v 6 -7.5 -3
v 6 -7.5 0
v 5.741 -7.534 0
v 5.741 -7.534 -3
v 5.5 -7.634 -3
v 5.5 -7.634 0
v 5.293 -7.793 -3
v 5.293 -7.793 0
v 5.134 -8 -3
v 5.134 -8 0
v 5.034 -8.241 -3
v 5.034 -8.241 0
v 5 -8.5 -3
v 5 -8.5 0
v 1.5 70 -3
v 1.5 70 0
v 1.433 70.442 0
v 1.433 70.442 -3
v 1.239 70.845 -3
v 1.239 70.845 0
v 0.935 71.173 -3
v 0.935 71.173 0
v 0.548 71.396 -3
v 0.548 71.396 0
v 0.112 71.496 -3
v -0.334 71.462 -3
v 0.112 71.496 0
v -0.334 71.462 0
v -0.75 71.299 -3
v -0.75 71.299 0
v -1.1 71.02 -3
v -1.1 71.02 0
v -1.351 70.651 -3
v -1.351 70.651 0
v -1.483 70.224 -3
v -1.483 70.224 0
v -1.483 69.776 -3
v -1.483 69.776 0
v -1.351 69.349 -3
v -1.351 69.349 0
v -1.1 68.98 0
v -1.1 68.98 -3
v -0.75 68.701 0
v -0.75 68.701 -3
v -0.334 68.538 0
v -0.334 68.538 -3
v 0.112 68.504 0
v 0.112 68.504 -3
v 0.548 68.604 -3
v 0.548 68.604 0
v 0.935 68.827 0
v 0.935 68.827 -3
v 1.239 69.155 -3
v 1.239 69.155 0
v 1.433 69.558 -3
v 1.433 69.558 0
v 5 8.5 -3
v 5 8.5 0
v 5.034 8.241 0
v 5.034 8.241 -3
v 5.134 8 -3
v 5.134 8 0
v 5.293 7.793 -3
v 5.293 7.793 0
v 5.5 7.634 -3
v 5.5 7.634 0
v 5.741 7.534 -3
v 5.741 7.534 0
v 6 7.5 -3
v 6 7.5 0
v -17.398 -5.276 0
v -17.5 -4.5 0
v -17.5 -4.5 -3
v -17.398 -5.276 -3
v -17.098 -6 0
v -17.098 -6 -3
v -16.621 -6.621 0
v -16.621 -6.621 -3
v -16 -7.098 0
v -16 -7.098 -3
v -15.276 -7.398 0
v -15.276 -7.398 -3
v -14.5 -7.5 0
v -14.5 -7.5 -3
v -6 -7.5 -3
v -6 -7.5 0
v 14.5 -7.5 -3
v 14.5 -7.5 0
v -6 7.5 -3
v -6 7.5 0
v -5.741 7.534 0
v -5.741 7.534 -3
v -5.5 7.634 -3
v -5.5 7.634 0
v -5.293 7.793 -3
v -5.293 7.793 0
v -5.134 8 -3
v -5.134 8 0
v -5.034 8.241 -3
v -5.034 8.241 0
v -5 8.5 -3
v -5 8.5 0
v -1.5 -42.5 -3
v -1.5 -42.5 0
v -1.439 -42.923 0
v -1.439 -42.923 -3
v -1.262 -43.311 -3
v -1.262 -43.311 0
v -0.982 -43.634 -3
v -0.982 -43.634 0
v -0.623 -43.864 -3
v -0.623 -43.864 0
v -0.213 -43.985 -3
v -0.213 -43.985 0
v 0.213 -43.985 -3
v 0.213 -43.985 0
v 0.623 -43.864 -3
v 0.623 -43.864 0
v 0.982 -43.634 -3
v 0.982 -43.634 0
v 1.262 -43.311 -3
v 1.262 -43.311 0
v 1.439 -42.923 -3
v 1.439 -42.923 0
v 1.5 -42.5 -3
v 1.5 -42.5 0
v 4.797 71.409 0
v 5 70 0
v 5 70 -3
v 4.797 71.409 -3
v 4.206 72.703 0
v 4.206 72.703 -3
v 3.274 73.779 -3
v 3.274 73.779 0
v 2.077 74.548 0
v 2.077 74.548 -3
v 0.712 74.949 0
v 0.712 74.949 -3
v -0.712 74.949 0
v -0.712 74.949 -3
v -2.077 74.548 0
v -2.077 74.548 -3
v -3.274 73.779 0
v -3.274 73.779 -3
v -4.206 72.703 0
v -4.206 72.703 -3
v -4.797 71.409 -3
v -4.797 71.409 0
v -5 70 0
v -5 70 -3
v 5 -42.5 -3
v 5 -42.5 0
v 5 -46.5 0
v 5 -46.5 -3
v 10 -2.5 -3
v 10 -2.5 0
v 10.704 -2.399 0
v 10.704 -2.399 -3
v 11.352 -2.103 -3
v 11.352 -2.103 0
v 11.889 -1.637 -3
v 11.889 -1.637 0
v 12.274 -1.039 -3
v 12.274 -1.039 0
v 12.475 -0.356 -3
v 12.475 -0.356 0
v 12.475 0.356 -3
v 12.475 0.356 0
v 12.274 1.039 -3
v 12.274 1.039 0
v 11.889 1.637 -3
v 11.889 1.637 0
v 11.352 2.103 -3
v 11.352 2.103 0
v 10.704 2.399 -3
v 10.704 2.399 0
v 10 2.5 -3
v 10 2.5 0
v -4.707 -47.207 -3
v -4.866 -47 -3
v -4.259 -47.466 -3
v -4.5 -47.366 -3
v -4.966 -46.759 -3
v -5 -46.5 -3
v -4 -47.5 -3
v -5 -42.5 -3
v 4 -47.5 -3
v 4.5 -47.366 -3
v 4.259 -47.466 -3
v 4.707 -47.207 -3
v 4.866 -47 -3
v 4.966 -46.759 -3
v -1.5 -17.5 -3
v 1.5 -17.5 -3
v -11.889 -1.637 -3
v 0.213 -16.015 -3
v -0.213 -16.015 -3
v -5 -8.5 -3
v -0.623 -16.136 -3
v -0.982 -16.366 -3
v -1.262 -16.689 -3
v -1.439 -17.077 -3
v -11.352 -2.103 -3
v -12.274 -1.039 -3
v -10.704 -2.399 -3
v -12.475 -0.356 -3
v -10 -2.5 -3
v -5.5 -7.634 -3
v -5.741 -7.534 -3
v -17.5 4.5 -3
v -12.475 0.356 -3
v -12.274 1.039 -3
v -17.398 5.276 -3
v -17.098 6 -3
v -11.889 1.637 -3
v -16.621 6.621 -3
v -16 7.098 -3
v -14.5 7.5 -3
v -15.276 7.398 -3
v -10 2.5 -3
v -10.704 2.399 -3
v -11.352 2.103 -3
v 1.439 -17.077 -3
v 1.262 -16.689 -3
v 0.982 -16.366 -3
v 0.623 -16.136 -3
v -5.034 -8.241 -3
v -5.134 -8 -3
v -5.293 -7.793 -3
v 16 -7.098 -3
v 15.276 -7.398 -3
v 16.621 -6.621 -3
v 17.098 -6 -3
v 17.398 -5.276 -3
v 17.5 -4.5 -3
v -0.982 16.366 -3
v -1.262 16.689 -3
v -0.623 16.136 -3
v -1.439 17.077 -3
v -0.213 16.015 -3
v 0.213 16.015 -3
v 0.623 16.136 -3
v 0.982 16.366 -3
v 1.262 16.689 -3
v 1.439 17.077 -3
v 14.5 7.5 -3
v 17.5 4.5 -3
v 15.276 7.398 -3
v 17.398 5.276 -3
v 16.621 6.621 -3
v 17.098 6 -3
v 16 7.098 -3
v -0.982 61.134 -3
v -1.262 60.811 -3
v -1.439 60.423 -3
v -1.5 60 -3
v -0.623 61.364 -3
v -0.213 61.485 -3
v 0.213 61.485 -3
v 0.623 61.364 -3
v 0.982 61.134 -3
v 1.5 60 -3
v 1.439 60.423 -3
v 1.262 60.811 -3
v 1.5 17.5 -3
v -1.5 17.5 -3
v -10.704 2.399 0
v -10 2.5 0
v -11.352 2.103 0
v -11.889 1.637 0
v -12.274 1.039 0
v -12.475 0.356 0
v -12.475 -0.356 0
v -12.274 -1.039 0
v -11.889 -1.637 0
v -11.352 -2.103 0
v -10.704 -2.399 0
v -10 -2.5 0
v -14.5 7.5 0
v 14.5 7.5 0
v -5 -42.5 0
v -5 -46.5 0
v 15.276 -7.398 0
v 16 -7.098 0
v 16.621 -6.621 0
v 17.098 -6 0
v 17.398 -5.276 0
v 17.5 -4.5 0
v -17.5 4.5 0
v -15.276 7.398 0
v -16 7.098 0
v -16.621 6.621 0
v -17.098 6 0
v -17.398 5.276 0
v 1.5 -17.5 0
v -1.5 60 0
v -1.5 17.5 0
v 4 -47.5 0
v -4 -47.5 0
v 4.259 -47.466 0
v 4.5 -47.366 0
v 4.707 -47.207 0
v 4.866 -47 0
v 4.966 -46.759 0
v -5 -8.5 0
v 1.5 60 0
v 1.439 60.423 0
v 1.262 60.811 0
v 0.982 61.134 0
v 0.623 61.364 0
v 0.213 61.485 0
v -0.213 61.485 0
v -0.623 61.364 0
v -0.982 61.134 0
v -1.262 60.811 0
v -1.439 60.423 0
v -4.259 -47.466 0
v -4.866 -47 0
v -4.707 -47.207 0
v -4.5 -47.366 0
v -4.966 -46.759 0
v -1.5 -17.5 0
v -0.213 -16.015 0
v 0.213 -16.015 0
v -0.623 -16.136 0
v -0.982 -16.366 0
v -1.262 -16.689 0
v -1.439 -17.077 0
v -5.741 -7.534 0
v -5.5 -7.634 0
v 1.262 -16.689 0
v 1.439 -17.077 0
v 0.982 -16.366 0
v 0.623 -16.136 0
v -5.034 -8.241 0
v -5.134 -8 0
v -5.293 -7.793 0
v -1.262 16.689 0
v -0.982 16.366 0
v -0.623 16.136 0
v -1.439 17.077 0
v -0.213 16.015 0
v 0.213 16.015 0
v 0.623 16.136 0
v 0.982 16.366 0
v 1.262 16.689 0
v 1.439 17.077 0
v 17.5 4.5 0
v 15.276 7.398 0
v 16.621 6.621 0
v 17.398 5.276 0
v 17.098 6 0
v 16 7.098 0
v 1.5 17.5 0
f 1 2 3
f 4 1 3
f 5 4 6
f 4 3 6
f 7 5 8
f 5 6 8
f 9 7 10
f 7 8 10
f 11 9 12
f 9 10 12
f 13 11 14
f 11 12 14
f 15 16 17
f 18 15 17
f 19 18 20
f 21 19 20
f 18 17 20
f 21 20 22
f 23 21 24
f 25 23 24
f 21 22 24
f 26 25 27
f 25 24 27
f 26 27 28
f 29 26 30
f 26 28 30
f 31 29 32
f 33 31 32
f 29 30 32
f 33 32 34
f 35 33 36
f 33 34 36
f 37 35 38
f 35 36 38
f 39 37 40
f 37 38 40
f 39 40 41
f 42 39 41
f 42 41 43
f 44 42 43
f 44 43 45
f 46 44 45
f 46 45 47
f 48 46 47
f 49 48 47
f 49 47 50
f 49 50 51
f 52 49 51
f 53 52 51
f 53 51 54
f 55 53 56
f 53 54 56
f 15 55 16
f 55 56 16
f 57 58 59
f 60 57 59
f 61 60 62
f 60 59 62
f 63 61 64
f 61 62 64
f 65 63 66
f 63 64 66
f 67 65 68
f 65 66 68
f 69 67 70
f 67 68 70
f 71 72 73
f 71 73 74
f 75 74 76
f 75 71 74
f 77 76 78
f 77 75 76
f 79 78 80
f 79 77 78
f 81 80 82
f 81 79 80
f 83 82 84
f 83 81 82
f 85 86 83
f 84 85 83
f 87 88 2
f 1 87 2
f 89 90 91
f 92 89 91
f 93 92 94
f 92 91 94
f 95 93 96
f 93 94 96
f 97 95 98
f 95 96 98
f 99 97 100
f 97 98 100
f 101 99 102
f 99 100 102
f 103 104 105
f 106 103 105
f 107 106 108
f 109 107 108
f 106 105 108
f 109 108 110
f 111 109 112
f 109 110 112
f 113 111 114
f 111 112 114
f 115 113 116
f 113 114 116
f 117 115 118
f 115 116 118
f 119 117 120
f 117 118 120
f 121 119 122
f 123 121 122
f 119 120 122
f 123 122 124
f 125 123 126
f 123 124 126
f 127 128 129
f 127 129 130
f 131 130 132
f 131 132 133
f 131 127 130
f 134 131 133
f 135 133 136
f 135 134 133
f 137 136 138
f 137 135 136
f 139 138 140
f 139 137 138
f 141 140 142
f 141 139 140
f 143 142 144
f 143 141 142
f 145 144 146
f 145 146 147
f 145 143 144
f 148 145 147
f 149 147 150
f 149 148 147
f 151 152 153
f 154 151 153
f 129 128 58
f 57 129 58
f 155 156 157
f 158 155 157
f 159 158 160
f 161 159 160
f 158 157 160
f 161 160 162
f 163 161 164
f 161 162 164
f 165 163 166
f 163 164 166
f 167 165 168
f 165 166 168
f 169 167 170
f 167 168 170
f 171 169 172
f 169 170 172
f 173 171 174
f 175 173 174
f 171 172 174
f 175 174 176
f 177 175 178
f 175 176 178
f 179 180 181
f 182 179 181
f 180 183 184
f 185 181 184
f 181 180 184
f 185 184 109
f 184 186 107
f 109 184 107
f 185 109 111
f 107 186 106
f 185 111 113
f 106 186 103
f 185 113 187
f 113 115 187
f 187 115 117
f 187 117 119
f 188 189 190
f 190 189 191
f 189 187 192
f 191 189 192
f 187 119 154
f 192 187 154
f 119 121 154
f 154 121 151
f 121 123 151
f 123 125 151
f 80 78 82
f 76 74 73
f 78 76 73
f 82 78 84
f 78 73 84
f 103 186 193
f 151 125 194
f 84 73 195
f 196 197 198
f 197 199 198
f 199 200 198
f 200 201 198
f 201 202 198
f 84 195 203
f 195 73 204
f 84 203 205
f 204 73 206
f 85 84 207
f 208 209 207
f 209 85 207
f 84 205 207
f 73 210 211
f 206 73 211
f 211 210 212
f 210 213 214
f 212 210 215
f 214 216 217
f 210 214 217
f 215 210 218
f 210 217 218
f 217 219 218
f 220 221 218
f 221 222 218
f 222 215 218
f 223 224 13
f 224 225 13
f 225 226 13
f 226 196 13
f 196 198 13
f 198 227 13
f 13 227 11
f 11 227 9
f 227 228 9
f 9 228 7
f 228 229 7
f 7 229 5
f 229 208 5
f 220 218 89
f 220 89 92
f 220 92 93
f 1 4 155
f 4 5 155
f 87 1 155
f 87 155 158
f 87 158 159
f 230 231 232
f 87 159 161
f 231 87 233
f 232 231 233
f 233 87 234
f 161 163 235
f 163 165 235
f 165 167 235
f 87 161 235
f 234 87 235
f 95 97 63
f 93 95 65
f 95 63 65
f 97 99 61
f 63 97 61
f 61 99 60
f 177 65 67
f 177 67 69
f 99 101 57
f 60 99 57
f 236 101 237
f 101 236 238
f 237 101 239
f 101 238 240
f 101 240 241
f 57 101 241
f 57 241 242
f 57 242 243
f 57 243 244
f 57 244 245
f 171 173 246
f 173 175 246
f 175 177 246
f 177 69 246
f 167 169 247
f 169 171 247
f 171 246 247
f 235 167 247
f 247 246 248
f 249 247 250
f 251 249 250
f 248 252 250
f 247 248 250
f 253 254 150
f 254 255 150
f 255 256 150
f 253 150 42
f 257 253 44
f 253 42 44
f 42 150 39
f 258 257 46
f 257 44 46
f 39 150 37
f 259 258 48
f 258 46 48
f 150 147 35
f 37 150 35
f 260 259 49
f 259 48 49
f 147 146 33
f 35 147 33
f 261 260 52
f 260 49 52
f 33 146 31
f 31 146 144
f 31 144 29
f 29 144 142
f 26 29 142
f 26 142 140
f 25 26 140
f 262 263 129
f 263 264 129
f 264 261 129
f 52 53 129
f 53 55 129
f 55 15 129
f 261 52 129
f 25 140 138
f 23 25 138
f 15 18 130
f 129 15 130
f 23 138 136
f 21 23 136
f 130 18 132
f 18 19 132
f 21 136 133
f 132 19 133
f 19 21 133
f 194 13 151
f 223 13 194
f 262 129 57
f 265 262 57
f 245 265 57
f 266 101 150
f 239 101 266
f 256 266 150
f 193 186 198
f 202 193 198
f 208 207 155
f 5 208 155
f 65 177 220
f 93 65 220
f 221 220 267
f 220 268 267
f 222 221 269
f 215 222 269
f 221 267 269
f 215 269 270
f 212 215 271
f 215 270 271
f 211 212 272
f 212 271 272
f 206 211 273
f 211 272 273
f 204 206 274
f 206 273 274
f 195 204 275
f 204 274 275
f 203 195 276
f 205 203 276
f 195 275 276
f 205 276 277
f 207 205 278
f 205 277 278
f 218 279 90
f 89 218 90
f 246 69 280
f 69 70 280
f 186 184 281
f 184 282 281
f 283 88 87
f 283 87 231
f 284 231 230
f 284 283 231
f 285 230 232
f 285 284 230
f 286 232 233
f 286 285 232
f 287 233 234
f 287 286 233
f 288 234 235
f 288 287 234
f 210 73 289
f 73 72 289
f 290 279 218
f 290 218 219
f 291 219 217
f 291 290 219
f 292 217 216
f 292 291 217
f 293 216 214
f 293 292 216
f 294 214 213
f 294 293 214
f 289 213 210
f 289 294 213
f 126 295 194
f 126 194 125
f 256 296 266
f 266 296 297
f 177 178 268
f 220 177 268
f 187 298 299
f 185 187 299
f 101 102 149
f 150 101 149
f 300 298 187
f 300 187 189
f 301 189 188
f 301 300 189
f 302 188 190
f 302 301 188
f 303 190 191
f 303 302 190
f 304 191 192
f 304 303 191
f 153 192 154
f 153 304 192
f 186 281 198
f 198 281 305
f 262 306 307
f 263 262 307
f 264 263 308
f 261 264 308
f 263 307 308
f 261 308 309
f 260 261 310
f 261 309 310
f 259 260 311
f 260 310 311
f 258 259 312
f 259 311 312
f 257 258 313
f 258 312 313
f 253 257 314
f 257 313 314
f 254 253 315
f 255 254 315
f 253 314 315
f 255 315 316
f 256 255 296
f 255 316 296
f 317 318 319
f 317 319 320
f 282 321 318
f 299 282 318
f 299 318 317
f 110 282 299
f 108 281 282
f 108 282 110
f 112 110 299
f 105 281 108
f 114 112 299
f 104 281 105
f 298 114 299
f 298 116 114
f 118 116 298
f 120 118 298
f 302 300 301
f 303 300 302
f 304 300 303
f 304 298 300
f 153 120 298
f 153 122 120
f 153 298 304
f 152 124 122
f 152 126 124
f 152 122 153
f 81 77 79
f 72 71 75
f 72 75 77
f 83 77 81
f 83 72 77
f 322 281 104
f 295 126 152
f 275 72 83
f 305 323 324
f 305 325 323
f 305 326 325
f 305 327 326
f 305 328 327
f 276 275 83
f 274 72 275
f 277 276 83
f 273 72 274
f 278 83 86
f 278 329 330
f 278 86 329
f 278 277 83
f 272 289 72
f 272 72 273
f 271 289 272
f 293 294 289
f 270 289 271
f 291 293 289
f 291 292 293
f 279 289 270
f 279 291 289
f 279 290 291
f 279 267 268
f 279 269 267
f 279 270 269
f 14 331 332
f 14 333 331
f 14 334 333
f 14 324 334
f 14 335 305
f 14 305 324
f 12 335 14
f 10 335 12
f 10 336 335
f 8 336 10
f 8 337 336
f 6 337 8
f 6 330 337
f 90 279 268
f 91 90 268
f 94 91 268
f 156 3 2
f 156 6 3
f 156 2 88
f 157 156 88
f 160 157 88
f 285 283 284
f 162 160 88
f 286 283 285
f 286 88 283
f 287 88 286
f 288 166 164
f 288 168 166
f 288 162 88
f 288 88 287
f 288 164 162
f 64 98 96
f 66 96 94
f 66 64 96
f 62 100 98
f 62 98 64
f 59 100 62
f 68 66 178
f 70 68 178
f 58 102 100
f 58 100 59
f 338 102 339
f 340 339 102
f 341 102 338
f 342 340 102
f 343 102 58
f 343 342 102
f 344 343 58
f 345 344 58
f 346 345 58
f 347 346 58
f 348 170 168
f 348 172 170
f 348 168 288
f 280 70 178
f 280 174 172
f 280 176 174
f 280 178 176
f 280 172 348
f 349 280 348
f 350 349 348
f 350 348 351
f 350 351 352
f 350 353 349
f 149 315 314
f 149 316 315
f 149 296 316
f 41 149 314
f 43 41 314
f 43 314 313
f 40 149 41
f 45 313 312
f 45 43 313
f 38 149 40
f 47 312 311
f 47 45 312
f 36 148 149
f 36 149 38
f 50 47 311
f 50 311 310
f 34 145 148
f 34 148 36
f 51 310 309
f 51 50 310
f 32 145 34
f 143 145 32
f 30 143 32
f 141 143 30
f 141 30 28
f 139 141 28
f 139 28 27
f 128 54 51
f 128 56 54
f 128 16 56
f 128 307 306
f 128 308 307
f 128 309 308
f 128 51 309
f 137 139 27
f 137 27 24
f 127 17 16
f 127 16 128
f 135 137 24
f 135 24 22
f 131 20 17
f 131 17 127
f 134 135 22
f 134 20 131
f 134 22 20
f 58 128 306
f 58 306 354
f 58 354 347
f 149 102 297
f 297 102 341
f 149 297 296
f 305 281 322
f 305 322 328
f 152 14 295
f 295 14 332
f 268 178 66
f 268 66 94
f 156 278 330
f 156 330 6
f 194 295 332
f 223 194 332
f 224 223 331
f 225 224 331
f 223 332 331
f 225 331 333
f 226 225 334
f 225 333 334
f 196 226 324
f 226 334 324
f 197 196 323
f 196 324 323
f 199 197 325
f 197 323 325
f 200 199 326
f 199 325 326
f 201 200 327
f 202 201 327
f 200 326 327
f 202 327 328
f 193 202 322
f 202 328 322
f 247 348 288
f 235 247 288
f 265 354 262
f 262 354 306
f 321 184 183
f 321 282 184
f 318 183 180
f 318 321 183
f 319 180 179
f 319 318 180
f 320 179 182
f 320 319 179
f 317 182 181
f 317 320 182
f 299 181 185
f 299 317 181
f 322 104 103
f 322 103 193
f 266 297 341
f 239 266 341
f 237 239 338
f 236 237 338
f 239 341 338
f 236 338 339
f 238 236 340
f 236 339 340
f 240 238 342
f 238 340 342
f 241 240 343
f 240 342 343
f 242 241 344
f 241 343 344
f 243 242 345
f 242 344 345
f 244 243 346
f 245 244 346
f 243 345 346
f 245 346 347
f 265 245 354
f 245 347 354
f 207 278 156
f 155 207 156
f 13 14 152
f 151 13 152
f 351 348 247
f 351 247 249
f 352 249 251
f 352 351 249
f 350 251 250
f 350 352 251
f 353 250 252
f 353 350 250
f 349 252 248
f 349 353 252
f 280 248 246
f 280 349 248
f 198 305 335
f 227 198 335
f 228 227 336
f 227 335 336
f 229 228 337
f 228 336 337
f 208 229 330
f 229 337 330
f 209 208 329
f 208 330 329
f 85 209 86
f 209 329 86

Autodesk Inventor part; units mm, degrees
ref_plane "YZ Plane" through (0, 0, 0) normal (1, 0, 0) x (0, 1, 0)
ref_plane "XZ Plane" through (0, 0, 0) normal (0, 1, 0) x (-1, 0, 0)
ref_plane "XY Plane" through (0, 0, 0) normal (0, 0, 1) x (1, 0, 0)
sketch "Sketch1" plane through (0, 0, 0) normal (0, 0, 1) x (1, 0, 0)
  line L0 (-10, 0) -> (10, 0) construction
  line L1 (-10, -2.5) -> (10, -2.5)
  line L2 (10, 2.5) -> (-10, 2.5)
  arc A0 (-10, 2.5) -> (-10, -2.5) centre (-10, 0) ccw
  arc A1 (10, -2.5) -> (10, 2.5) centre (10, 0) ccw
  line L3 (17.5, 4.5) -> (17.5, -4.5)
  line L4 (-17.5, -4.5) -> (-17.5, 4.5)
  line L5 (-5, 70) -> (5, 70) construction
  line L6 (5, 70) -> (5, 8.5)
  line L7 (-5, 7.5) -> (-5, 7.5)
  line L8 (-5, 8.5) -> (-5, 70)
  line L9 (5, -7.5) -> (5, -7.5)
  line L10 (5, -8.5) -> (5, -42.5)
  line L11 (5, -42.5) -> (-5, -42.5) construction
  line L12 (-5, -42.5) -> (-5, -8.5)
  line L13 (14.5, -7.5) -> (6, -7.5)
  line L14 (-6, -7.5) -> (-14.5, -7.5)
  line L15 (-14.5, 7.5) -> (-6, 7.5)
  line L16 (6, 7.5) -> (14.5, 7.5)
  arc A2 (5, 70) -> (-5, 70) centre (0, 70) ccw
  circle A3 centre (0, 70) radius 1.5
  line L17 (0, 60) -> (0, 17.5) construction
  line L18 (-1.5, 60) -> (-1.5, 17.5)
  line L19 (1.5, 17.5) -> (1.5, 60)
  arc A4 (1.5, 60) -> (-1.5, 60) centre (0, 60) ccw
  arc A5 (-1.5, 17.5) -> (1.5, 17.5) centre (0, 17.5) ccw
  arc A6 (-5, -42.5) -> (5, -42.5) centre (0, -42.5) ccw construction
  line L20 (0, -42.5) -> (0, -17.5) construction
  line L21 (-1.5, -42.5) -> (-1.5, -17.5)
  line L22 (1.5, -17.5) -> (1.5, -42.5)
  arc A7 (-1.5, -42.5) -> (1.5, -42.5) centre (0, -42.5) ccw
  arc A8 (1.5, -17.5) -> (-1.5, -17.5) centre (0, -17.5) ccw
  arc A9 (17.5, 4.5) -> (14.5, 7.5) centre (14.5, 4.5) ccw
  arc A10 (14.5, -7.5) -> (17.5, -4.5) centre (14.5, -4.5) ccw
  arc A11 (-17.5, -4.5) -> (-14.5, -7.5) centre (-14.5, -4.5) ccw
  arc A12 (-14.5, 7.5) -> (-17.5, 4.5) centre (-14.5, 4.5) ccw
  arc A13 (-5, -8.5) -> (-6, -7.5) centre (-6, -8.5) ccw
  arc A14 (6, -7.5) -> (5, -8.5) centre (6, -8.5) ccw
  arc A15 (5, 8.5) -> (6, 7.5) centre (6, 8.5) ccw
  arc A16 (-6, 7.5) -> (-5, 8.5) centre (-6, 8.5) ccw
  line L23 (5, -42.5) -> (5, -46.5)
  line L24 (4, -47.5) -> (-4, -47.5)
  line L25 (-5, -46.5) -> (-5, -42.5)
  arc A17 (4, -47.5) -> (5, -46.5) centre (4, -46.5) ccw
  arc A18 (-5, -46.5) -> (-4, -47.5) centre (-4, -46.5) ccw
  point P0 (0, 0)
  point P1 (0, 2.5)
  point P2 (-17.5, 0)
  point P3 (17.5, 0)
  point P4 (0, 38.75)
  point P5 (0, -30)
  dimension "d0" = 10
  dimension "d1" = 35
  dimension "d2" = 15
  dimension "d3" = 5
  dimension "d4" = 20
  dimension "d5" = 3
  dimension "d6" = 10
  dimension "d7" = 10
  dimension "d8" = 70
  dimension "d9" = 3
  dimension "d10" = 35
  dimension "d11" = 3
  dimension "d12" = 10
  dimension "d13" = 3
  dimension "d14" = 1
  dimension "d17" = 1
extrude "Extrusion1" add sketch "Sketch1" against normal blind 3
properties part number "Slider_1"
